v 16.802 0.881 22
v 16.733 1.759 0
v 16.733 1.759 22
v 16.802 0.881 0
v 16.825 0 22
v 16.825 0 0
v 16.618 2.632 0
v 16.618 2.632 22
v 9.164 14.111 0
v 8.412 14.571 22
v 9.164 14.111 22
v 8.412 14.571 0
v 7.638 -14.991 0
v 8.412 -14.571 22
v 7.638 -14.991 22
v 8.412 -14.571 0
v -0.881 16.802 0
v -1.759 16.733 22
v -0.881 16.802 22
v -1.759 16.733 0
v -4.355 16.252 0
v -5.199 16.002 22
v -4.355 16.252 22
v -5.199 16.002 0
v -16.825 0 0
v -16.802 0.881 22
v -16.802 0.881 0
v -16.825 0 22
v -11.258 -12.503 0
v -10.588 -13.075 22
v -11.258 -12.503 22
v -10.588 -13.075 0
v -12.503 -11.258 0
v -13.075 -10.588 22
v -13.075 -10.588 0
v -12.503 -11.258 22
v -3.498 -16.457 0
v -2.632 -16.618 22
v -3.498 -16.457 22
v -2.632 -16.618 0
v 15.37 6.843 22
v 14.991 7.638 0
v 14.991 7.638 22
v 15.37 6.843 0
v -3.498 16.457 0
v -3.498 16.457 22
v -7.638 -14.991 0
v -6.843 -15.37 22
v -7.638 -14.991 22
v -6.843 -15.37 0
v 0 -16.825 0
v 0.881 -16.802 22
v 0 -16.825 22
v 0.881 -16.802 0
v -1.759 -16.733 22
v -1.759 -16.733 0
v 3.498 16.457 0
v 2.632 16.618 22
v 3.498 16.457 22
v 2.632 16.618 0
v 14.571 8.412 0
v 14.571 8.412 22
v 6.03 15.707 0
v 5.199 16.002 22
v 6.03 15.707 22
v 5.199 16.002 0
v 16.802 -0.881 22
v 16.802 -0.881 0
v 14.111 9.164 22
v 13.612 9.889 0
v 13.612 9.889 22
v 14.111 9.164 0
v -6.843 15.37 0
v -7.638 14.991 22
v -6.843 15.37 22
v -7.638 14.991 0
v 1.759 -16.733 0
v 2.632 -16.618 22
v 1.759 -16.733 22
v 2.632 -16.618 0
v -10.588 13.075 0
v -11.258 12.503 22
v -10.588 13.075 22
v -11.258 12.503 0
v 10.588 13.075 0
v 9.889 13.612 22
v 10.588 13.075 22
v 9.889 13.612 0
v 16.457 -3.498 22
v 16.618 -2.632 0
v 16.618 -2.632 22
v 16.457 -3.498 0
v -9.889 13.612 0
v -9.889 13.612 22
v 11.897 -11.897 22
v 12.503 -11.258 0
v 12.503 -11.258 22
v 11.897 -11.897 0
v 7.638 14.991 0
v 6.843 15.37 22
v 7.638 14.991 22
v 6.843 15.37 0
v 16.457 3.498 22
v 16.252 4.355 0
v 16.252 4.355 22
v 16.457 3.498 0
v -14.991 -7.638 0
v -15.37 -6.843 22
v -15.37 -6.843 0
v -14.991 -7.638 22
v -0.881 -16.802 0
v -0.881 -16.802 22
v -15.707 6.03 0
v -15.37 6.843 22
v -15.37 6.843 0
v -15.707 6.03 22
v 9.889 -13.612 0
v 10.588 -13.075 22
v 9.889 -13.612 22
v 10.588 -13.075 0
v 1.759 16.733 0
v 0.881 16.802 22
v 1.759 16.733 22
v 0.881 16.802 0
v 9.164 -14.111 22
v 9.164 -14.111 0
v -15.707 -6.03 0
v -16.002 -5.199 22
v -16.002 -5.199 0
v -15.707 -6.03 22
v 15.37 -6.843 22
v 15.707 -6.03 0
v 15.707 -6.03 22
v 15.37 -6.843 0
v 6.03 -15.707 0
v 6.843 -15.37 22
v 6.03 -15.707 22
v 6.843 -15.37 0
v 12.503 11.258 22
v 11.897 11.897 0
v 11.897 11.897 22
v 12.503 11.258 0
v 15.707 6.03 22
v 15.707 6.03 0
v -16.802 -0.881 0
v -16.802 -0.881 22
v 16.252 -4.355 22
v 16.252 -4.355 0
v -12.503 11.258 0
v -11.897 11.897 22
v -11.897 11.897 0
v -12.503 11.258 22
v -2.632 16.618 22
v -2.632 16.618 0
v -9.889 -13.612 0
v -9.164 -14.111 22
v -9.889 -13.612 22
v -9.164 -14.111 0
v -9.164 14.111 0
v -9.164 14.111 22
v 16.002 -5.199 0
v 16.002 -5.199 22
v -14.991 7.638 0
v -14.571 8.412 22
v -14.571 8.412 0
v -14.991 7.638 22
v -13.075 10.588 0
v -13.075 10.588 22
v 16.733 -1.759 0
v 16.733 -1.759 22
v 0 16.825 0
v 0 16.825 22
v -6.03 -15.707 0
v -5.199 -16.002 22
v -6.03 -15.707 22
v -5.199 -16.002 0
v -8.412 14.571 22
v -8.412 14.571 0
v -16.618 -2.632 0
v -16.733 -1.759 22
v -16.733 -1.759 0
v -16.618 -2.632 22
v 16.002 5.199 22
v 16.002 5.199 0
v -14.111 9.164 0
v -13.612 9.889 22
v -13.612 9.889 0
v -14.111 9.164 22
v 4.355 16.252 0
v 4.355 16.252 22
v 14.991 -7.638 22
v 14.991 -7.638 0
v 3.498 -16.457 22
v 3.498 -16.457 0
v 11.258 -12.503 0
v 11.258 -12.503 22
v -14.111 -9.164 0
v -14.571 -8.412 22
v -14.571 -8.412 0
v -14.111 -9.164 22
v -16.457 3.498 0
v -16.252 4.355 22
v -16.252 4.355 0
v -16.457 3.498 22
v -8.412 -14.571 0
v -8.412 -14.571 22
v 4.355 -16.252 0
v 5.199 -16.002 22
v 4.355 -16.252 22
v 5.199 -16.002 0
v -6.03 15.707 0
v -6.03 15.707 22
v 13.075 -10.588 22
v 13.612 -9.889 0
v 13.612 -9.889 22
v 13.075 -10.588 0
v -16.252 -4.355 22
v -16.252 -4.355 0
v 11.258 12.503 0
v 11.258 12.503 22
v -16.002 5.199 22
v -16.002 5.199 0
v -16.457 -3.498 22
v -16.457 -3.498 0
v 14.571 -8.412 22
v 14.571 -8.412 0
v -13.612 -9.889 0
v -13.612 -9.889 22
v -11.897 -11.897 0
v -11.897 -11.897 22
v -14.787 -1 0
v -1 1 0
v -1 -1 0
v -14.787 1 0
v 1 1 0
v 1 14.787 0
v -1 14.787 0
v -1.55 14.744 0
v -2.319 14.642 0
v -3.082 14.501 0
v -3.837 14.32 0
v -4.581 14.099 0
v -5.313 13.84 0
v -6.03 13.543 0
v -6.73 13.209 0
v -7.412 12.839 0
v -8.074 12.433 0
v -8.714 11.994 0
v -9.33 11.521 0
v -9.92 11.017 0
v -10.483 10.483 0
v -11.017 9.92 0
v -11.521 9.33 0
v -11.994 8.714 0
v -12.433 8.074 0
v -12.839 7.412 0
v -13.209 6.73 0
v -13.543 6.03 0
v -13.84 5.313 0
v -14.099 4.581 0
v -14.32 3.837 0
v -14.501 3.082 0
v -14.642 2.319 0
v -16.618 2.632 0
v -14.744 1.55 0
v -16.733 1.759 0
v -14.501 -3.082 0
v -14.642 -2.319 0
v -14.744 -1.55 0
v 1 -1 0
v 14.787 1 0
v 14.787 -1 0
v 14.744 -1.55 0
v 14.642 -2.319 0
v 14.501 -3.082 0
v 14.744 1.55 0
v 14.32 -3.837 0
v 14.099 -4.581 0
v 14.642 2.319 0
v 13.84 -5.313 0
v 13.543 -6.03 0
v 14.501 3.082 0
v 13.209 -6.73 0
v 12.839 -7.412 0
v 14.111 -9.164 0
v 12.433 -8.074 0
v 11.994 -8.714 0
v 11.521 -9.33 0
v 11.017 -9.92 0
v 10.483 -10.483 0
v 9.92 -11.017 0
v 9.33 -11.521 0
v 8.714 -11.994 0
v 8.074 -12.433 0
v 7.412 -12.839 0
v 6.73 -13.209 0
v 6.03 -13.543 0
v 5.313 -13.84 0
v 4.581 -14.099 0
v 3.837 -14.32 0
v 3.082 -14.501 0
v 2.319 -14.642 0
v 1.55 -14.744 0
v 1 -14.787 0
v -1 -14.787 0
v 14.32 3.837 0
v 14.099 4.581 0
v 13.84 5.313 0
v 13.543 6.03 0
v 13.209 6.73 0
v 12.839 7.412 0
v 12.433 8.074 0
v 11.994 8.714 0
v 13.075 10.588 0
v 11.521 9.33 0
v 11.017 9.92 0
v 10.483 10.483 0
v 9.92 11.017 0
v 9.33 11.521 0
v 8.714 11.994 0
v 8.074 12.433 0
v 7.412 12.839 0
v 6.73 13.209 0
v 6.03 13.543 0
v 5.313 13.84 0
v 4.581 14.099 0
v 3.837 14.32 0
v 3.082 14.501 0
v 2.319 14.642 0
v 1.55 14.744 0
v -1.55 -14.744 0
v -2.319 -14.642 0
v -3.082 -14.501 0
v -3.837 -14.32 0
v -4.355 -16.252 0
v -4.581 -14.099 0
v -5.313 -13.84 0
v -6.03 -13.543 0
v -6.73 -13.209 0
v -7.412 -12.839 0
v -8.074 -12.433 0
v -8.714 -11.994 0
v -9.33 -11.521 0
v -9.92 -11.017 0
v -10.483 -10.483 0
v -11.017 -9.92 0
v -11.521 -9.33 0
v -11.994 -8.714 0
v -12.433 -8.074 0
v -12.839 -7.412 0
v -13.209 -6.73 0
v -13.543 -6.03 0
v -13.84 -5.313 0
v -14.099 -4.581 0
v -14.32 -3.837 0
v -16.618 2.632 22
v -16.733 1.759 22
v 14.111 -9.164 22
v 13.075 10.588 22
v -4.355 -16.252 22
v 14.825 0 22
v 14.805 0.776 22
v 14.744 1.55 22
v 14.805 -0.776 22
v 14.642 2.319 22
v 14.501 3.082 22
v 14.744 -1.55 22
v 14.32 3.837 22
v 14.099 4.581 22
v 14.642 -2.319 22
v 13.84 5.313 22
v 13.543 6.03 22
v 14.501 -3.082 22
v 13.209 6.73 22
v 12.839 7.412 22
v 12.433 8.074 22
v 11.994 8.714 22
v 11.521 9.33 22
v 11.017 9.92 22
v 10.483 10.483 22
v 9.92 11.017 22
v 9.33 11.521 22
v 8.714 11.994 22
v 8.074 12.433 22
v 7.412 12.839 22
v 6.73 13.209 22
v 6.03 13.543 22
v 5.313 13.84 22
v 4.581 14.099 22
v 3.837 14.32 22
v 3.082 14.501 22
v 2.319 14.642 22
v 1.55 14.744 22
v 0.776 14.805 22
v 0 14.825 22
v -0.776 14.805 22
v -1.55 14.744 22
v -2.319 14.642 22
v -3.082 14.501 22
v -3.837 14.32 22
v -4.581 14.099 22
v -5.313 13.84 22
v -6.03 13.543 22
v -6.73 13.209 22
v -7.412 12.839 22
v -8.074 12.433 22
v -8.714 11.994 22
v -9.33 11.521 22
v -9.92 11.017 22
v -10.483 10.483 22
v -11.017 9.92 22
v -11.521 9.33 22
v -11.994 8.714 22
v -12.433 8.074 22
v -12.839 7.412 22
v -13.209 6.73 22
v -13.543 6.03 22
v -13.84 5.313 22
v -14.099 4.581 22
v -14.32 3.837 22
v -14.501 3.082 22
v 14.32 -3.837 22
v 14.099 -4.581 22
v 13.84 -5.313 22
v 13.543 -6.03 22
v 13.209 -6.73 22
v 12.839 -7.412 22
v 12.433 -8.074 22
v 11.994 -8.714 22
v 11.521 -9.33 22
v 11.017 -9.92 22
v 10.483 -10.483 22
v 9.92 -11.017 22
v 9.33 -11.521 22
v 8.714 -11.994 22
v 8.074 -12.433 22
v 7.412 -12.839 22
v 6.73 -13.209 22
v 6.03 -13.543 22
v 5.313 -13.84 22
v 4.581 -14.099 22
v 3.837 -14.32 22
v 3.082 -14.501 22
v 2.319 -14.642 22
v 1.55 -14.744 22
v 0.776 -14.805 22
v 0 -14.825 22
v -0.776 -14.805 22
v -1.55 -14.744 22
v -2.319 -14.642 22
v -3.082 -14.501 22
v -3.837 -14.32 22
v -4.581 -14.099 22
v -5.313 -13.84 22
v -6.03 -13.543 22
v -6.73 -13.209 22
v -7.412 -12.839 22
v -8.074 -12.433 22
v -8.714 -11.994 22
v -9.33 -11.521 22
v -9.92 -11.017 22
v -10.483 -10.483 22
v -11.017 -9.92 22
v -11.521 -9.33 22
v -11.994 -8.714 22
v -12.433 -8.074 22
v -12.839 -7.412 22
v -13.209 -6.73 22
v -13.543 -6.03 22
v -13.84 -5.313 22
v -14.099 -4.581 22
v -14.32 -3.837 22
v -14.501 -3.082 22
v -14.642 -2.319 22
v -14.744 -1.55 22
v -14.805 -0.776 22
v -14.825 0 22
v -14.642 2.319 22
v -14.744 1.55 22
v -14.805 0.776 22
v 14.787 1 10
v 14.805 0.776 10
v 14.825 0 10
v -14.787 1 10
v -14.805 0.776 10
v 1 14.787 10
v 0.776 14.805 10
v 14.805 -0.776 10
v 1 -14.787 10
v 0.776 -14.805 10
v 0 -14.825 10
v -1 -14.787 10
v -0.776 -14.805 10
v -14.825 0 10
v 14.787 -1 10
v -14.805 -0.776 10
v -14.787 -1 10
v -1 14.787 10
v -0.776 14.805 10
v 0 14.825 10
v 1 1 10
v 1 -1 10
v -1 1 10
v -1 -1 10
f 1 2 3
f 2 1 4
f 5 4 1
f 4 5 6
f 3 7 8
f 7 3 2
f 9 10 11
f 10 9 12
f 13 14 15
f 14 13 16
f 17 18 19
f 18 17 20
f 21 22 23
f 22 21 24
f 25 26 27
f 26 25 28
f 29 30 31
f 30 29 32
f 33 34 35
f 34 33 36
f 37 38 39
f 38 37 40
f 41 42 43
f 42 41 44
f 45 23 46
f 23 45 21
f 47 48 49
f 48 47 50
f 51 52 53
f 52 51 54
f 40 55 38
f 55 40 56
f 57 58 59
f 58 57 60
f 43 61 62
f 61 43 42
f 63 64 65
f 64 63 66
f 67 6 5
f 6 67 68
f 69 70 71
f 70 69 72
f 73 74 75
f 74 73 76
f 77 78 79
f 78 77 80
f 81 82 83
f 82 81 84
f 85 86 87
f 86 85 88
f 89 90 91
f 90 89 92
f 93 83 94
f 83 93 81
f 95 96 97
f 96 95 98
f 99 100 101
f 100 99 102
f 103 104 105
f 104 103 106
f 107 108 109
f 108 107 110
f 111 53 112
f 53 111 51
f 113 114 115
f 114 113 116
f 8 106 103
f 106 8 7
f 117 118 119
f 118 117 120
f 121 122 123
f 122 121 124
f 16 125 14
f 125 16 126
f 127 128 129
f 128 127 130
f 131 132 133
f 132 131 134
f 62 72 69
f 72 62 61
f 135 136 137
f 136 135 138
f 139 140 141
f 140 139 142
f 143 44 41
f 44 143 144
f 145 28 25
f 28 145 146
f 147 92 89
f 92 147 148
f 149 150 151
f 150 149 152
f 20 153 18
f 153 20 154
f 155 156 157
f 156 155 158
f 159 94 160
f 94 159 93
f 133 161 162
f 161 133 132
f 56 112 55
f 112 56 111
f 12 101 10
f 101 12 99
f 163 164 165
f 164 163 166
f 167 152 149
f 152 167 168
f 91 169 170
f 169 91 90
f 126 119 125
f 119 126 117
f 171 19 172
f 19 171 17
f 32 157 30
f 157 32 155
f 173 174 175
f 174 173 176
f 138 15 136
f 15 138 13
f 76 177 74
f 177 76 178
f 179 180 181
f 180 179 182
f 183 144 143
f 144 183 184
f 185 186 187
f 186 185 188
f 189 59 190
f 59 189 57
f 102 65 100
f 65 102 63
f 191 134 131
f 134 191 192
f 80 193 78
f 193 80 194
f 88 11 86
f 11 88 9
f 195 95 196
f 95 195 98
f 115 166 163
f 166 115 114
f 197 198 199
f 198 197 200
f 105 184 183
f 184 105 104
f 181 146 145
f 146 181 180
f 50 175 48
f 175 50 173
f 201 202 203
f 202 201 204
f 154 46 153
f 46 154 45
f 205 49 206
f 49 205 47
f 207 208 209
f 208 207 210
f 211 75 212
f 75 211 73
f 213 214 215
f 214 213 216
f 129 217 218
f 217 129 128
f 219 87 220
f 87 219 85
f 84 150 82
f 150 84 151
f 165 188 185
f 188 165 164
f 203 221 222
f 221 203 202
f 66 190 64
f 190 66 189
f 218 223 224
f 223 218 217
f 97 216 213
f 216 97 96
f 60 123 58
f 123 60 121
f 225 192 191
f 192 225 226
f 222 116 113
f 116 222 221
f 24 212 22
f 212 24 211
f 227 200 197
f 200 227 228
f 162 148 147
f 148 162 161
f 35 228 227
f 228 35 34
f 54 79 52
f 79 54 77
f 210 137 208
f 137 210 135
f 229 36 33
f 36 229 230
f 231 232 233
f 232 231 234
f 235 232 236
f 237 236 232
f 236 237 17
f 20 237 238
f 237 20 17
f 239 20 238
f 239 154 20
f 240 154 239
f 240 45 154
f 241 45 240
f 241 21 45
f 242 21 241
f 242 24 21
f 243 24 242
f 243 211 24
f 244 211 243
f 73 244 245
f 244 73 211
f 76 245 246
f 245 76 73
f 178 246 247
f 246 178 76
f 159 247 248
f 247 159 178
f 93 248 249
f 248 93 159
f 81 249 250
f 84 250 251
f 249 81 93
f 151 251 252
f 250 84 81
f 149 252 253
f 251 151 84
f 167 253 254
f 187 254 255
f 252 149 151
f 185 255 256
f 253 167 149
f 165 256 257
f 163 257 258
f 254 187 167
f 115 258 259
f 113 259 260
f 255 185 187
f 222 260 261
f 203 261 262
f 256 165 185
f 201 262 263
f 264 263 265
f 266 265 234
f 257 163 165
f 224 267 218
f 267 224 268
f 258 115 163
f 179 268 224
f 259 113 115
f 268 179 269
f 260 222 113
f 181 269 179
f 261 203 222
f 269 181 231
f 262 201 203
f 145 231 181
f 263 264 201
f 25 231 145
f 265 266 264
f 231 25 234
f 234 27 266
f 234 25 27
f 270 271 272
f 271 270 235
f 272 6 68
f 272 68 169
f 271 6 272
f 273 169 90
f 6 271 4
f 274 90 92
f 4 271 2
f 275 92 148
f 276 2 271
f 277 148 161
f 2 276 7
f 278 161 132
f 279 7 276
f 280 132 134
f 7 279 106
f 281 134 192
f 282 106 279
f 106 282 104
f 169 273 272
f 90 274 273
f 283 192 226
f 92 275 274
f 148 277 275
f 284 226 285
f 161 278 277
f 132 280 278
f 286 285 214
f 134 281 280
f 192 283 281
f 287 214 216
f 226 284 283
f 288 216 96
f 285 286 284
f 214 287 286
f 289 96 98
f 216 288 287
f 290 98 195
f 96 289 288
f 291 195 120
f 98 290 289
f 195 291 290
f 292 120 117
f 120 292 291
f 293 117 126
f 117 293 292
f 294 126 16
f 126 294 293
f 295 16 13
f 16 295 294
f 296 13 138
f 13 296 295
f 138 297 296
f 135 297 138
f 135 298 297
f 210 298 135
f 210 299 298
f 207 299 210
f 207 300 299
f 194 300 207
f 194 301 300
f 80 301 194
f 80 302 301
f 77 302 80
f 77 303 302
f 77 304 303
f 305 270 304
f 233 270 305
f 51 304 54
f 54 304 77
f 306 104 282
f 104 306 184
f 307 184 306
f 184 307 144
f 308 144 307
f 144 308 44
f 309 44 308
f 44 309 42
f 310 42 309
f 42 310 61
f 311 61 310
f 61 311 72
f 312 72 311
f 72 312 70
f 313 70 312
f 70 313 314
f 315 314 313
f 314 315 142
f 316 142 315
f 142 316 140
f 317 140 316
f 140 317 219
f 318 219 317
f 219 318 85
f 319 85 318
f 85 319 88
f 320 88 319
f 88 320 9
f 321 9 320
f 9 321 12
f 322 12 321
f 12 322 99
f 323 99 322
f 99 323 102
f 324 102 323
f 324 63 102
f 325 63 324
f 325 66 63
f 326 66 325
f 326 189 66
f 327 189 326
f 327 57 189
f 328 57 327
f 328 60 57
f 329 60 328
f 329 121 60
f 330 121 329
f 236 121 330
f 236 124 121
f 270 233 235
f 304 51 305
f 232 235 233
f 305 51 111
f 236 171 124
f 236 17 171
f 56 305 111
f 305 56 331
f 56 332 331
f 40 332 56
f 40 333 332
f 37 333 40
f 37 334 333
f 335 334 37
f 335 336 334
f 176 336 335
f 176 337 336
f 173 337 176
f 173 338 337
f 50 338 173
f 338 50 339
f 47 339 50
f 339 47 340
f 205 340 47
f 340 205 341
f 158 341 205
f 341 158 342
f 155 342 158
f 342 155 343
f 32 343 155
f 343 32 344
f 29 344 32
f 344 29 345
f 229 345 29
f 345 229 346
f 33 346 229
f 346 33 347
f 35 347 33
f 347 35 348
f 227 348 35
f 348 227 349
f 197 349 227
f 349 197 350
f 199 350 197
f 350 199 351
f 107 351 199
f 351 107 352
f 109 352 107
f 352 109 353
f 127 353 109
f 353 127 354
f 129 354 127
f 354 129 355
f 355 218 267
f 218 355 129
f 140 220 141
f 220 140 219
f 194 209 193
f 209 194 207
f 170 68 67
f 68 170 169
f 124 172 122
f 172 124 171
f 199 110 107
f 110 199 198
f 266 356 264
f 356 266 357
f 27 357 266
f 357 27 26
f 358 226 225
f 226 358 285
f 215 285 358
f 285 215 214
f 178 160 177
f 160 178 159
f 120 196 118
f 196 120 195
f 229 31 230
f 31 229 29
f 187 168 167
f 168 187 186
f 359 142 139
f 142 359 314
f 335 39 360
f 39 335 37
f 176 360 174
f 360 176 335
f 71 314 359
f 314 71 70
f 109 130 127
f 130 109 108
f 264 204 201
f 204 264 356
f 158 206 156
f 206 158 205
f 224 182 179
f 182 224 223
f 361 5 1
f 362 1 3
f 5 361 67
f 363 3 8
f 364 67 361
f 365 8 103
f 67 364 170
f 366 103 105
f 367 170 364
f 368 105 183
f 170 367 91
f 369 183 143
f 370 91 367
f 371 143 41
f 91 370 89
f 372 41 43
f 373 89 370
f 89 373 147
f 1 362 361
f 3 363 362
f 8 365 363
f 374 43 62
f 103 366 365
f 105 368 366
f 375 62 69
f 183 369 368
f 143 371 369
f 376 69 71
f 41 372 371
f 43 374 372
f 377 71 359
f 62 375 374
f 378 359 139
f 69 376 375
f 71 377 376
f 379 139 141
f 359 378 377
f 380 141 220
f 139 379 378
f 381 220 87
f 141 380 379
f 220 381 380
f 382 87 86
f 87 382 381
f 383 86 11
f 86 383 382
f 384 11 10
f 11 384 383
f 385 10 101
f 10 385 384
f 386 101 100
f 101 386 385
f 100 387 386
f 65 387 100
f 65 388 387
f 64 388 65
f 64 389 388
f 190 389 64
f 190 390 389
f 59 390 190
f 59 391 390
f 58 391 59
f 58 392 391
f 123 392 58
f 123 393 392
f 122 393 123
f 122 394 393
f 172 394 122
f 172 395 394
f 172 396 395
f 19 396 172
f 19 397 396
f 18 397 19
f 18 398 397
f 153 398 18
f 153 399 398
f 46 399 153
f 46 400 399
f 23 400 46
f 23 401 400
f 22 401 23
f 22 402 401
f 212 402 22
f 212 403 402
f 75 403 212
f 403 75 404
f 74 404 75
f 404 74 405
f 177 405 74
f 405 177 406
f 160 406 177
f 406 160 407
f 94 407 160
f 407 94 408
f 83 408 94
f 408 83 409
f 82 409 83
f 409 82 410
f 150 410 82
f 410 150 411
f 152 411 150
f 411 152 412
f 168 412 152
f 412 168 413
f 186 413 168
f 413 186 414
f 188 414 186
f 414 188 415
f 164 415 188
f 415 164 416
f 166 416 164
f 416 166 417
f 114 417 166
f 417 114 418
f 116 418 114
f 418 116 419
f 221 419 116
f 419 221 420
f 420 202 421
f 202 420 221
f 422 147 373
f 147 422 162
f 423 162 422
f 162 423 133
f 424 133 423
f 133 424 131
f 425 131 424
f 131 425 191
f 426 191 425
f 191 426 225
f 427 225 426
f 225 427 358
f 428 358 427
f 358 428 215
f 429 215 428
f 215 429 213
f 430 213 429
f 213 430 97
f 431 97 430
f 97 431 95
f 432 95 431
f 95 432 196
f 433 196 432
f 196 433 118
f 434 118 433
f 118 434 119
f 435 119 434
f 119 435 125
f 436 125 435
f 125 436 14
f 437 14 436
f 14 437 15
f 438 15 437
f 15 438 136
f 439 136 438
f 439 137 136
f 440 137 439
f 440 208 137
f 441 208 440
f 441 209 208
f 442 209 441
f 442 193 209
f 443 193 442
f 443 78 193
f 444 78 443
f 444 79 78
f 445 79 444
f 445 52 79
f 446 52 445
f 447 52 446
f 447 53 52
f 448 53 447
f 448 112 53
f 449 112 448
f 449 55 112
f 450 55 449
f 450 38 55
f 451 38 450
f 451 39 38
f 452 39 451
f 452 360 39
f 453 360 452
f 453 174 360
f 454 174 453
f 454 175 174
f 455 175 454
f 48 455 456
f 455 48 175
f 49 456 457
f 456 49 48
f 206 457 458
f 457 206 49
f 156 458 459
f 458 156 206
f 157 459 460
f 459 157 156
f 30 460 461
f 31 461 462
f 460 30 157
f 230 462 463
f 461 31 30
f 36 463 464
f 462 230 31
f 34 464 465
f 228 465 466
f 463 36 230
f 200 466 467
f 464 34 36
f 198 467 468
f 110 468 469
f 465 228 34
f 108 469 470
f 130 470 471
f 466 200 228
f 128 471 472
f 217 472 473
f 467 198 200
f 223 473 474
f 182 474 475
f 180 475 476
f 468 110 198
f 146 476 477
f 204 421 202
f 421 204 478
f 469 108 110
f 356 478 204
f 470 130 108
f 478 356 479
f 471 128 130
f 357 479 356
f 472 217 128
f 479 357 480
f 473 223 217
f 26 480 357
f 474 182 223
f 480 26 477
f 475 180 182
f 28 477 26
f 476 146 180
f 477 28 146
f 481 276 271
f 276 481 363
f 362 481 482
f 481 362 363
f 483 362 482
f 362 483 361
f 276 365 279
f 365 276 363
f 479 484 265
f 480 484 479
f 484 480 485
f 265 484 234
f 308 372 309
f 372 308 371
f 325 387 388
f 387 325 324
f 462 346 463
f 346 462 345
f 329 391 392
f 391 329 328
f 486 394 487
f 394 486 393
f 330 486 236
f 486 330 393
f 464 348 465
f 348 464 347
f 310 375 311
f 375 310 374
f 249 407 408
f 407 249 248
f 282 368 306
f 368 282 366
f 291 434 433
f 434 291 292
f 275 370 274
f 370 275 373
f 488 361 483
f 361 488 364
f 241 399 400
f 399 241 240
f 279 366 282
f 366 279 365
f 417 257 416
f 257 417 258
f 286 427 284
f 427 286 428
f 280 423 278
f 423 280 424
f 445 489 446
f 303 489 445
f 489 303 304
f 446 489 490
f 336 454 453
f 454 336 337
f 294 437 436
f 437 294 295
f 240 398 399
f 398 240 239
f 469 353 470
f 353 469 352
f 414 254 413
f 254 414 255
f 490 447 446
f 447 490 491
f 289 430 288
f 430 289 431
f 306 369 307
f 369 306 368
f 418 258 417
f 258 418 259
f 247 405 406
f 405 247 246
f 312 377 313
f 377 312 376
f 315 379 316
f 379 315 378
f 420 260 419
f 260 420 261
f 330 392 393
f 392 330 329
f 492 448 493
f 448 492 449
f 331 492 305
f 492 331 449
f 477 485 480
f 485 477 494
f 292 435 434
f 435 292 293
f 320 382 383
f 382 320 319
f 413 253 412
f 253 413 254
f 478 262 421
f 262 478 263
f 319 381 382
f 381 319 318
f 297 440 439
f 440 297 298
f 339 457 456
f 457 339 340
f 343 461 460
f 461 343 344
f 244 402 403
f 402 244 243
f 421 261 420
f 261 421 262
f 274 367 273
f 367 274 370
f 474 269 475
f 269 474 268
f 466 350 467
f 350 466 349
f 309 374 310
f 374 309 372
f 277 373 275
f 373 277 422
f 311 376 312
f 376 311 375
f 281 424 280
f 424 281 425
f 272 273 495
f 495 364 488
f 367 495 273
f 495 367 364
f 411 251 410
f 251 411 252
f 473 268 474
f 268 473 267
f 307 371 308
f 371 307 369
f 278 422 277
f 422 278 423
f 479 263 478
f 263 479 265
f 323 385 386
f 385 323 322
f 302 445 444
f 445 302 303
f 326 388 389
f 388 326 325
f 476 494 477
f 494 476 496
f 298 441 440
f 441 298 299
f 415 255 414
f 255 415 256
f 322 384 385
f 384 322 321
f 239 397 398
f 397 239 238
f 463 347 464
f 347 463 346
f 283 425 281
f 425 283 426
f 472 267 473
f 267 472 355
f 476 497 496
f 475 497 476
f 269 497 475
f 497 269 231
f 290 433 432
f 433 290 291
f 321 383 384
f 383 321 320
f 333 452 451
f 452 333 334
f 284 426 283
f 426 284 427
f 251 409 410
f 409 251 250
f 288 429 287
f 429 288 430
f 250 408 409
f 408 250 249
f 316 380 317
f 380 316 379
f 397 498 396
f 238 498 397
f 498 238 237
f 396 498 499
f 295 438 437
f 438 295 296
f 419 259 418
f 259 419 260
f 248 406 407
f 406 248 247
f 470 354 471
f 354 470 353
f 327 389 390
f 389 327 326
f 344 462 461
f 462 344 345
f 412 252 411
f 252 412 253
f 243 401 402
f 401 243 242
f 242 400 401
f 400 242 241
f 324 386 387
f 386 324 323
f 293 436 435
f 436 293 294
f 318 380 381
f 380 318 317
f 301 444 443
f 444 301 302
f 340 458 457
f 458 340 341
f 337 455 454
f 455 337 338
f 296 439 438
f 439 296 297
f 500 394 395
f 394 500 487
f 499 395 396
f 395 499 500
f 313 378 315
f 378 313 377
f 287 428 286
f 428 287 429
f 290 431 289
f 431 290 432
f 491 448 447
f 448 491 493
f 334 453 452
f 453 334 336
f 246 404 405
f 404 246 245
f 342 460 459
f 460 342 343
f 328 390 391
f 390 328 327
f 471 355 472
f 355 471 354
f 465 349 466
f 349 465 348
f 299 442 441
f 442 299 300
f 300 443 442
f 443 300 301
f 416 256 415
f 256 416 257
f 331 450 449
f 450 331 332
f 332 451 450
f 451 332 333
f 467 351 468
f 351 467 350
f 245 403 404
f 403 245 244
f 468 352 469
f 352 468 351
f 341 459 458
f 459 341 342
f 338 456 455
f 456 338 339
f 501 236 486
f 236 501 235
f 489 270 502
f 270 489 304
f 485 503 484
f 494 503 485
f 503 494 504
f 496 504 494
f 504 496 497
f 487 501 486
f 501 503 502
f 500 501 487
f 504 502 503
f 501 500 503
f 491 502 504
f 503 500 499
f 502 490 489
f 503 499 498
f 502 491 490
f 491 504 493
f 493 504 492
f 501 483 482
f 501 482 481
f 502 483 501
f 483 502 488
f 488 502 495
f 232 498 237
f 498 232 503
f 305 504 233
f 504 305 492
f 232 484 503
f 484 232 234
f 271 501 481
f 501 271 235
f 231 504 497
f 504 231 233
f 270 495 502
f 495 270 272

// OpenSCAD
// file: AquariumIntakeDimensions.scad
overcut = 1;
default_thickness = 5;
default_bevel = 2;

aquarium_length=1231;
aquarium_width=622;
aquarium_height=640;
glass_thickness=12; // +/- 1mm
iron_width=44;
iron_top_width=25.5;
iron_top_side_indent_width=9.47;
iron_top_back_indent_width=6.3;
iron_top_indent_depth=9.25;
iron_top_indent_thickness=5;
iron_top_cross_bar_width=50;
iron_thickness=6; // +/- 1mm
pipe_od=33.40;
pipe_id=26.14;
elbow_od=40.5;
elbow_overlap=22.0;

npt_adapter_length=47;
npt_adapter_od=40;
npt_adapter_overlap=22;
npt_adapter_hex_diameter=50;  // guess
npt_adapter_hex_length=5; // guess

camlock_female_npt_overlap=17.3; // guess
camlock_female_npt_length=61; // guess
camlock_female_npt_wide_length=41.4; // guess
camlock_female_npt_wide_od=50;

camlock_male_npt_overlap=17.3; // guess
camlock_male_npt_length=78.6; // guess
camlock_male_npt_hex_length=14.3; // guess
camlock_male_npt_hex_od=50; // guess

camlock_male_part_od=36.5; // guess
camlock_male_part_id=22.2; // guess
camlock_male_part_length=34.9; // guess
camlock_clearance=1; // guess

valve_pipe_length=80;

npt_reducer_elbow_overlap=10;

siphon_offset_x = elbow_od/2 + iron_top_width + iron_top_side_indent_width + 2*default_thickness;
siphon_offset_y = 61;
siphon_offset_z = 40;
// main file
include <AquariumIntakeDimensions.scad>

module turtle_excluder(
    wall_thickness = 2,
    grid_depth = 10,
    excluder_diameter = pipe_od+0.25,
    total_depth = elbow_overlap
) {
    union() {
        difference() {
            cylinder(h=total_depth, d=excluder_diameter, $fn=120);
            translate([0,0,-overcut])
            cylinder(h=total_depth + 2*overcut, d=excluder_diameter - 2*wall_thickness, $fn=120);
        }
        translate([-wall_thickness/2, -excluder_diameter/2 + wall_thickness/2, 0])
        cube([wall_thickness, excluder_diameter - wall_thickness, grid_depth]);
        translate([-excluder_diameter/2 + wall_thickness/2, -wall_thickness/2, 0])
        cube([excluder_diameter - wall_thickness, wall_thickness, grid_depth]);
    }
}

turtle_excluder();
